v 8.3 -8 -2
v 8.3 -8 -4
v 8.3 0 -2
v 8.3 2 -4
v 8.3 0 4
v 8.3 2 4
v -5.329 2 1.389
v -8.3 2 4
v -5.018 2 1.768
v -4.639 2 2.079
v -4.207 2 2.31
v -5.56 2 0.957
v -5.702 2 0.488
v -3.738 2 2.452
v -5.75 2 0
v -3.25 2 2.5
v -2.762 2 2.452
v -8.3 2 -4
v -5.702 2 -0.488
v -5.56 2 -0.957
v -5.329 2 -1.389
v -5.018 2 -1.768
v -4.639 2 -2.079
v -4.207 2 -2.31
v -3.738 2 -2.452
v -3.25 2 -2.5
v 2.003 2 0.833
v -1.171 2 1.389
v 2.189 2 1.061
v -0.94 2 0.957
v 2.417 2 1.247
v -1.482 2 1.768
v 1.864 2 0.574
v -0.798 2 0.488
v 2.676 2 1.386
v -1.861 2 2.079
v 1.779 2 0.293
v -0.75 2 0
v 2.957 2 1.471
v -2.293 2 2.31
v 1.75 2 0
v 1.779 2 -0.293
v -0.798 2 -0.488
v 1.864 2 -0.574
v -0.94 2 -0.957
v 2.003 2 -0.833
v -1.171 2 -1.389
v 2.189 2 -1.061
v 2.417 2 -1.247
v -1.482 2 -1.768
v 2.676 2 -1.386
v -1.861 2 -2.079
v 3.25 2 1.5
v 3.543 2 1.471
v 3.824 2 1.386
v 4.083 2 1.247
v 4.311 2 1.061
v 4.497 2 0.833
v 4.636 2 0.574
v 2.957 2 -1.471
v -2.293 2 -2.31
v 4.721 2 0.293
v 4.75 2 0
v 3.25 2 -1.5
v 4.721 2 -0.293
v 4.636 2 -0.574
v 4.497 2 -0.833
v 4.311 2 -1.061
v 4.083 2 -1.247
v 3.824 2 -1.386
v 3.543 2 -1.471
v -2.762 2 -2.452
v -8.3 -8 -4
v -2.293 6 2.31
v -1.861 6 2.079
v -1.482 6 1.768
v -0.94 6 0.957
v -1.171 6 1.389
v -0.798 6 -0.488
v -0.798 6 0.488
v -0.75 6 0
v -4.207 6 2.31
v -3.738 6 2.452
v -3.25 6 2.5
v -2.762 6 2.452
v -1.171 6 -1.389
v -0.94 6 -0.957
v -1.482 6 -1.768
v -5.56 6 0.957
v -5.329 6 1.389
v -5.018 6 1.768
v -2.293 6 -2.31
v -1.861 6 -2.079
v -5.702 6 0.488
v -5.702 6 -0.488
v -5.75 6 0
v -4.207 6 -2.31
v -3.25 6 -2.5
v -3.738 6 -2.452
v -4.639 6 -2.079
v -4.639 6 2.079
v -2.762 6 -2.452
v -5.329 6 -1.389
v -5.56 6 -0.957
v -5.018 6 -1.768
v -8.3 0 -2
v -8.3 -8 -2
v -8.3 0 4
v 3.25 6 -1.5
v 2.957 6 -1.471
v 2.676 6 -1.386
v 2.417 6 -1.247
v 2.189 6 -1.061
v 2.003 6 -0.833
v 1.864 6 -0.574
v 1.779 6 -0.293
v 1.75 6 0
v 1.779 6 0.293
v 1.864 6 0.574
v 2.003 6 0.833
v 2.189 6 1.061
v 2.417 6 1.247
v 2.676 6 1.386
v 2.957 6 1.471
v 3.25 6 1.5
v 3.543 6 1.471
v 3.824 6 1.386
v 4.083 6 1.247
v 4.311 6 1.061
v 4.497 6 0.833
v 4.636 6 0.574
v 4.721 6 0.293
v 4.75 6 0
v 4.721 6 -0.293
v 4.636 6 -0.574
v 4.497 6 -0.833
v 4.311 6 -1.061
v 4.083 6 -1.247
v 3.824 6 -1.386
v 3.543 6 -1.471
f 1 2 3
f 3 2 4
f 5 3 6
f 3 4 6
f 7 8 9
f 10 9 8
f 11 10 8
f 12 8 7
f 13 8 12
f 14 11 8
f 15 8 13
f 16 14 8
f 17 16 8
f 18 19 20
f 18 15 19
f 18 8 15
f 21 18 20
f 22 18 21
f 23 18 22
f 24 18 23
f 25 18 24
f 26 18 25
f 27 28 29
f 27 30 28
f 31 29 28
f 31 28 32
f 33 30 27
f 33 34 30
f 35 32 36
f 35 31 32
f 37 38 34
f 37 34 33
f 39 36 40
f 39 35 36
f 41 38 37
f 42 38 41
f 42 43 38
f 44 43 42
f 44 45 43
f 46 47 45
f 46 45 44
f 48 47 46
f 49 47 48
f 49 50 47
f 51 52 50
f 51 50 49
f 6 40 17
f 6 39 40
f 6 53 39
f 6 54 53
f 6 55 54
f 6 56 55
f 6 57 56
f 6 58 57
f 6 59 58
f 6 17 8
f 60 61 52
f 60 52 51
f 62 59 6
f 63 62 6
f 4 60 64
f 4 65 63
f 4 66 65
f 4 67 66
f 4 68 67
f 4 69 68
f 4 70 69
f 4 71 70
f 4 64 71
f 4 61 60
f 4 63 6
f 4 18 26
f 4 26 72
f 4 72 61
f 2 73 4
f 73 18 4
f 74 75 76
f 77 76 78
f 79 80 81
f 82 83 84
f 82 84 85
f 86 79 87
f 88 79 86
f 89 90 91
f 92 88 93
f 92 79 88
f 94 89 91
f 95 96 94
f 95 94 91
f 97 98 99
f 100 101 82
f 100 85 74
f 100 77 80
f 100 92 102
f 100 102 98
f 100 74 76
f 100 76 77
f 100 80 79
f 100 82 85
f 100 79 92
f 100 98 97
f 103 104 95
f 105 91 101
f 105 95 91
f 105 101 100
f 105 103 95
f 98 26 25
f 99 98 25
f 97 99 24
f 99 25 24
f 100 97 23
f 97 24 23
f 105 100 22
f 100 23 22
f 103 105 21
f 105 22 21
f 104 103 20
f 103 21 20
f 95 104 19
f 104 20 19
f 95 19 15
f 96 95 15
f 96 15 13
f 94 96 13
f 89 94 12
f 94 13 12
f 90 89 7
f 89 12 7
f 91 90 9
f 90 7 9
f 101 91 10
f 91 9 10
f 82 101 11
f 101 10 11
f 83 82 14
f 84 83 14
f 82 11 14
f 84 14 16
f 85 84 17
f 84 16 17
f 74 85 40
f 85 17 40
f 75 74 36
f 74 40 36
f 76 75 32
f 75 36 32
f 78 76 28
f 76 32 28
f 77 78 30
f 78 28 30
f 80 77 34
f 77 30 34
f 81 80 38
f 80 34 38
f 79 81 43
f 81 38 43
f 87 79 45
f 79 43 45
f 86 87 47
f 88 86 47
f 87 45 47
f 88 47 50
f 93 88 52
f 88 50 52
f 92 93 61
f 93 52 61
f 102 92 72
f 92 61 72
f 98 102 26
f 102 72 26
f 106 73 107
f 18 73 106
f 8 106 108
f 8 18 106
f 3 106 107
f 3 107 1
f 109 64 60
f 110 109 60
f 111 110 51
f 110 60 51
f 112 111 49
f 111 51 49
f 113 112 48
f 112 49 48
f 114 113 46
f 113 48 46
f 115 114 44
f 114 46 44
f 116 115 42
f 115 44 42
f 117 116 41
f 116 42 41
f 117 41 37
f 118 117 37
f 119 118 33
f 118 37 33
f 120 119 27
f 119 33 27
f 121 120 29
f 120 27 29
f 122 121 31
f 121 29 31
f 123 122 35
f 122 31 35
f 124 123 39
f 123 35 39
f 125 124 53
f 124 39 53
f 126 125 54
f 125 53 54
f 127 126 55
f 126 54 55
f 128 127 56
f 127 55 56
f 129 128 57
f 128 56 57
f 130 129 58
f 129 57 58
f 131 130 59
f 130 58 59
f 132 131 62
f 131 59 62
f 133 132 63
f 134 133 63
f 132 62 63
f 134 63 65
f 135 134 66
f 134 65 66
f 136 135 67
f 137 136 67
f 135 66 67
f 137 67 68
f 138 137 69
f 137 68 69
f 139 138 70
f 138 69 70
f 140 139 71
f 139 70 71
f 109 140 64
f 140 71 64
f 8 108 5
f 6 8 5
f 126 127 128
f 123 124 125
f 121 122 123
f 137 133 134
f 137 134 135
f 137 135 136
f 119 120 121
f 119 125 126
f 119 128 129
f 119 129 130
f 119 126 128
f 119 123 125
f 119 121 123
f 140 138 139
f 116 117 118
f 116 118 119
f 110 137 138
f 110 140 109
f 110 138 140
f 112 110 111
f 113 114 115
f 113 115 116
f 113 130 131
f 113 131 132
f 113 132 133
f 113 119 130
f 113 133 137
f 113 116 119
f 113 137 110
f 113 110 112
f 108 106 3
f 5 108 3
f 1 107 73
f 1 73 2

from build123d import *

# Parameters (mm, degrees)
SKETCH1_W           = 16.6
SKETCH1_H           = 8
BOSS_EXTRUDE1_DEPTH = 2
SKETCH2_R           = 2.5
SKETCH2_R_2         = 1.5
BOSS_EXTRUDE2_DEPTH = 4
SKETCH3_W           = 16.6
SKETCH3_H           = 2
BOSS_EXTRUDE3_DEPTH = 8


with BuildPart() as part:
    # Sketch1 → Boss-Extrude1 (new body)
    with BuildSketch(Plane(origin=(0, 0, 0), x_dir=(1, 0, 0), z_dir=(0, 1, 0))):
        Rectangle(SKETCH1_W, SKETCH1_H)
    extrude(amount=BOSS_EXTRUDE1_DEPTH)

    # Sketch2 → Boss-Extrude2 (add)
    with BuildSketch(Plane(origin=(0, 2, 0), x_dir=(1, 0, 0), z_dir=(0, 1, 0))):
        with Locations(Location((-3.25, 0, 0), (0, 0, 90))):
            Circle(SKETCH2_R)
        with Locations(Location((3.25, 0, 0), (0, 0, 90))):
            Circle(SKETCH2_R_2)
    extrude(amount=BOSS_EXTRUDE2_DEPTH)

    # Sketch3 → Boss-Extrude3 (add)
    with BuildSketch(Plane.XZ):
        with Locations((0, -3)):
            Rectangle(SKETCH3_W, SKETCH3_H)
    extrude(amount=BOSS_EXTRUDE3_DEPTH)


solid = part.part
